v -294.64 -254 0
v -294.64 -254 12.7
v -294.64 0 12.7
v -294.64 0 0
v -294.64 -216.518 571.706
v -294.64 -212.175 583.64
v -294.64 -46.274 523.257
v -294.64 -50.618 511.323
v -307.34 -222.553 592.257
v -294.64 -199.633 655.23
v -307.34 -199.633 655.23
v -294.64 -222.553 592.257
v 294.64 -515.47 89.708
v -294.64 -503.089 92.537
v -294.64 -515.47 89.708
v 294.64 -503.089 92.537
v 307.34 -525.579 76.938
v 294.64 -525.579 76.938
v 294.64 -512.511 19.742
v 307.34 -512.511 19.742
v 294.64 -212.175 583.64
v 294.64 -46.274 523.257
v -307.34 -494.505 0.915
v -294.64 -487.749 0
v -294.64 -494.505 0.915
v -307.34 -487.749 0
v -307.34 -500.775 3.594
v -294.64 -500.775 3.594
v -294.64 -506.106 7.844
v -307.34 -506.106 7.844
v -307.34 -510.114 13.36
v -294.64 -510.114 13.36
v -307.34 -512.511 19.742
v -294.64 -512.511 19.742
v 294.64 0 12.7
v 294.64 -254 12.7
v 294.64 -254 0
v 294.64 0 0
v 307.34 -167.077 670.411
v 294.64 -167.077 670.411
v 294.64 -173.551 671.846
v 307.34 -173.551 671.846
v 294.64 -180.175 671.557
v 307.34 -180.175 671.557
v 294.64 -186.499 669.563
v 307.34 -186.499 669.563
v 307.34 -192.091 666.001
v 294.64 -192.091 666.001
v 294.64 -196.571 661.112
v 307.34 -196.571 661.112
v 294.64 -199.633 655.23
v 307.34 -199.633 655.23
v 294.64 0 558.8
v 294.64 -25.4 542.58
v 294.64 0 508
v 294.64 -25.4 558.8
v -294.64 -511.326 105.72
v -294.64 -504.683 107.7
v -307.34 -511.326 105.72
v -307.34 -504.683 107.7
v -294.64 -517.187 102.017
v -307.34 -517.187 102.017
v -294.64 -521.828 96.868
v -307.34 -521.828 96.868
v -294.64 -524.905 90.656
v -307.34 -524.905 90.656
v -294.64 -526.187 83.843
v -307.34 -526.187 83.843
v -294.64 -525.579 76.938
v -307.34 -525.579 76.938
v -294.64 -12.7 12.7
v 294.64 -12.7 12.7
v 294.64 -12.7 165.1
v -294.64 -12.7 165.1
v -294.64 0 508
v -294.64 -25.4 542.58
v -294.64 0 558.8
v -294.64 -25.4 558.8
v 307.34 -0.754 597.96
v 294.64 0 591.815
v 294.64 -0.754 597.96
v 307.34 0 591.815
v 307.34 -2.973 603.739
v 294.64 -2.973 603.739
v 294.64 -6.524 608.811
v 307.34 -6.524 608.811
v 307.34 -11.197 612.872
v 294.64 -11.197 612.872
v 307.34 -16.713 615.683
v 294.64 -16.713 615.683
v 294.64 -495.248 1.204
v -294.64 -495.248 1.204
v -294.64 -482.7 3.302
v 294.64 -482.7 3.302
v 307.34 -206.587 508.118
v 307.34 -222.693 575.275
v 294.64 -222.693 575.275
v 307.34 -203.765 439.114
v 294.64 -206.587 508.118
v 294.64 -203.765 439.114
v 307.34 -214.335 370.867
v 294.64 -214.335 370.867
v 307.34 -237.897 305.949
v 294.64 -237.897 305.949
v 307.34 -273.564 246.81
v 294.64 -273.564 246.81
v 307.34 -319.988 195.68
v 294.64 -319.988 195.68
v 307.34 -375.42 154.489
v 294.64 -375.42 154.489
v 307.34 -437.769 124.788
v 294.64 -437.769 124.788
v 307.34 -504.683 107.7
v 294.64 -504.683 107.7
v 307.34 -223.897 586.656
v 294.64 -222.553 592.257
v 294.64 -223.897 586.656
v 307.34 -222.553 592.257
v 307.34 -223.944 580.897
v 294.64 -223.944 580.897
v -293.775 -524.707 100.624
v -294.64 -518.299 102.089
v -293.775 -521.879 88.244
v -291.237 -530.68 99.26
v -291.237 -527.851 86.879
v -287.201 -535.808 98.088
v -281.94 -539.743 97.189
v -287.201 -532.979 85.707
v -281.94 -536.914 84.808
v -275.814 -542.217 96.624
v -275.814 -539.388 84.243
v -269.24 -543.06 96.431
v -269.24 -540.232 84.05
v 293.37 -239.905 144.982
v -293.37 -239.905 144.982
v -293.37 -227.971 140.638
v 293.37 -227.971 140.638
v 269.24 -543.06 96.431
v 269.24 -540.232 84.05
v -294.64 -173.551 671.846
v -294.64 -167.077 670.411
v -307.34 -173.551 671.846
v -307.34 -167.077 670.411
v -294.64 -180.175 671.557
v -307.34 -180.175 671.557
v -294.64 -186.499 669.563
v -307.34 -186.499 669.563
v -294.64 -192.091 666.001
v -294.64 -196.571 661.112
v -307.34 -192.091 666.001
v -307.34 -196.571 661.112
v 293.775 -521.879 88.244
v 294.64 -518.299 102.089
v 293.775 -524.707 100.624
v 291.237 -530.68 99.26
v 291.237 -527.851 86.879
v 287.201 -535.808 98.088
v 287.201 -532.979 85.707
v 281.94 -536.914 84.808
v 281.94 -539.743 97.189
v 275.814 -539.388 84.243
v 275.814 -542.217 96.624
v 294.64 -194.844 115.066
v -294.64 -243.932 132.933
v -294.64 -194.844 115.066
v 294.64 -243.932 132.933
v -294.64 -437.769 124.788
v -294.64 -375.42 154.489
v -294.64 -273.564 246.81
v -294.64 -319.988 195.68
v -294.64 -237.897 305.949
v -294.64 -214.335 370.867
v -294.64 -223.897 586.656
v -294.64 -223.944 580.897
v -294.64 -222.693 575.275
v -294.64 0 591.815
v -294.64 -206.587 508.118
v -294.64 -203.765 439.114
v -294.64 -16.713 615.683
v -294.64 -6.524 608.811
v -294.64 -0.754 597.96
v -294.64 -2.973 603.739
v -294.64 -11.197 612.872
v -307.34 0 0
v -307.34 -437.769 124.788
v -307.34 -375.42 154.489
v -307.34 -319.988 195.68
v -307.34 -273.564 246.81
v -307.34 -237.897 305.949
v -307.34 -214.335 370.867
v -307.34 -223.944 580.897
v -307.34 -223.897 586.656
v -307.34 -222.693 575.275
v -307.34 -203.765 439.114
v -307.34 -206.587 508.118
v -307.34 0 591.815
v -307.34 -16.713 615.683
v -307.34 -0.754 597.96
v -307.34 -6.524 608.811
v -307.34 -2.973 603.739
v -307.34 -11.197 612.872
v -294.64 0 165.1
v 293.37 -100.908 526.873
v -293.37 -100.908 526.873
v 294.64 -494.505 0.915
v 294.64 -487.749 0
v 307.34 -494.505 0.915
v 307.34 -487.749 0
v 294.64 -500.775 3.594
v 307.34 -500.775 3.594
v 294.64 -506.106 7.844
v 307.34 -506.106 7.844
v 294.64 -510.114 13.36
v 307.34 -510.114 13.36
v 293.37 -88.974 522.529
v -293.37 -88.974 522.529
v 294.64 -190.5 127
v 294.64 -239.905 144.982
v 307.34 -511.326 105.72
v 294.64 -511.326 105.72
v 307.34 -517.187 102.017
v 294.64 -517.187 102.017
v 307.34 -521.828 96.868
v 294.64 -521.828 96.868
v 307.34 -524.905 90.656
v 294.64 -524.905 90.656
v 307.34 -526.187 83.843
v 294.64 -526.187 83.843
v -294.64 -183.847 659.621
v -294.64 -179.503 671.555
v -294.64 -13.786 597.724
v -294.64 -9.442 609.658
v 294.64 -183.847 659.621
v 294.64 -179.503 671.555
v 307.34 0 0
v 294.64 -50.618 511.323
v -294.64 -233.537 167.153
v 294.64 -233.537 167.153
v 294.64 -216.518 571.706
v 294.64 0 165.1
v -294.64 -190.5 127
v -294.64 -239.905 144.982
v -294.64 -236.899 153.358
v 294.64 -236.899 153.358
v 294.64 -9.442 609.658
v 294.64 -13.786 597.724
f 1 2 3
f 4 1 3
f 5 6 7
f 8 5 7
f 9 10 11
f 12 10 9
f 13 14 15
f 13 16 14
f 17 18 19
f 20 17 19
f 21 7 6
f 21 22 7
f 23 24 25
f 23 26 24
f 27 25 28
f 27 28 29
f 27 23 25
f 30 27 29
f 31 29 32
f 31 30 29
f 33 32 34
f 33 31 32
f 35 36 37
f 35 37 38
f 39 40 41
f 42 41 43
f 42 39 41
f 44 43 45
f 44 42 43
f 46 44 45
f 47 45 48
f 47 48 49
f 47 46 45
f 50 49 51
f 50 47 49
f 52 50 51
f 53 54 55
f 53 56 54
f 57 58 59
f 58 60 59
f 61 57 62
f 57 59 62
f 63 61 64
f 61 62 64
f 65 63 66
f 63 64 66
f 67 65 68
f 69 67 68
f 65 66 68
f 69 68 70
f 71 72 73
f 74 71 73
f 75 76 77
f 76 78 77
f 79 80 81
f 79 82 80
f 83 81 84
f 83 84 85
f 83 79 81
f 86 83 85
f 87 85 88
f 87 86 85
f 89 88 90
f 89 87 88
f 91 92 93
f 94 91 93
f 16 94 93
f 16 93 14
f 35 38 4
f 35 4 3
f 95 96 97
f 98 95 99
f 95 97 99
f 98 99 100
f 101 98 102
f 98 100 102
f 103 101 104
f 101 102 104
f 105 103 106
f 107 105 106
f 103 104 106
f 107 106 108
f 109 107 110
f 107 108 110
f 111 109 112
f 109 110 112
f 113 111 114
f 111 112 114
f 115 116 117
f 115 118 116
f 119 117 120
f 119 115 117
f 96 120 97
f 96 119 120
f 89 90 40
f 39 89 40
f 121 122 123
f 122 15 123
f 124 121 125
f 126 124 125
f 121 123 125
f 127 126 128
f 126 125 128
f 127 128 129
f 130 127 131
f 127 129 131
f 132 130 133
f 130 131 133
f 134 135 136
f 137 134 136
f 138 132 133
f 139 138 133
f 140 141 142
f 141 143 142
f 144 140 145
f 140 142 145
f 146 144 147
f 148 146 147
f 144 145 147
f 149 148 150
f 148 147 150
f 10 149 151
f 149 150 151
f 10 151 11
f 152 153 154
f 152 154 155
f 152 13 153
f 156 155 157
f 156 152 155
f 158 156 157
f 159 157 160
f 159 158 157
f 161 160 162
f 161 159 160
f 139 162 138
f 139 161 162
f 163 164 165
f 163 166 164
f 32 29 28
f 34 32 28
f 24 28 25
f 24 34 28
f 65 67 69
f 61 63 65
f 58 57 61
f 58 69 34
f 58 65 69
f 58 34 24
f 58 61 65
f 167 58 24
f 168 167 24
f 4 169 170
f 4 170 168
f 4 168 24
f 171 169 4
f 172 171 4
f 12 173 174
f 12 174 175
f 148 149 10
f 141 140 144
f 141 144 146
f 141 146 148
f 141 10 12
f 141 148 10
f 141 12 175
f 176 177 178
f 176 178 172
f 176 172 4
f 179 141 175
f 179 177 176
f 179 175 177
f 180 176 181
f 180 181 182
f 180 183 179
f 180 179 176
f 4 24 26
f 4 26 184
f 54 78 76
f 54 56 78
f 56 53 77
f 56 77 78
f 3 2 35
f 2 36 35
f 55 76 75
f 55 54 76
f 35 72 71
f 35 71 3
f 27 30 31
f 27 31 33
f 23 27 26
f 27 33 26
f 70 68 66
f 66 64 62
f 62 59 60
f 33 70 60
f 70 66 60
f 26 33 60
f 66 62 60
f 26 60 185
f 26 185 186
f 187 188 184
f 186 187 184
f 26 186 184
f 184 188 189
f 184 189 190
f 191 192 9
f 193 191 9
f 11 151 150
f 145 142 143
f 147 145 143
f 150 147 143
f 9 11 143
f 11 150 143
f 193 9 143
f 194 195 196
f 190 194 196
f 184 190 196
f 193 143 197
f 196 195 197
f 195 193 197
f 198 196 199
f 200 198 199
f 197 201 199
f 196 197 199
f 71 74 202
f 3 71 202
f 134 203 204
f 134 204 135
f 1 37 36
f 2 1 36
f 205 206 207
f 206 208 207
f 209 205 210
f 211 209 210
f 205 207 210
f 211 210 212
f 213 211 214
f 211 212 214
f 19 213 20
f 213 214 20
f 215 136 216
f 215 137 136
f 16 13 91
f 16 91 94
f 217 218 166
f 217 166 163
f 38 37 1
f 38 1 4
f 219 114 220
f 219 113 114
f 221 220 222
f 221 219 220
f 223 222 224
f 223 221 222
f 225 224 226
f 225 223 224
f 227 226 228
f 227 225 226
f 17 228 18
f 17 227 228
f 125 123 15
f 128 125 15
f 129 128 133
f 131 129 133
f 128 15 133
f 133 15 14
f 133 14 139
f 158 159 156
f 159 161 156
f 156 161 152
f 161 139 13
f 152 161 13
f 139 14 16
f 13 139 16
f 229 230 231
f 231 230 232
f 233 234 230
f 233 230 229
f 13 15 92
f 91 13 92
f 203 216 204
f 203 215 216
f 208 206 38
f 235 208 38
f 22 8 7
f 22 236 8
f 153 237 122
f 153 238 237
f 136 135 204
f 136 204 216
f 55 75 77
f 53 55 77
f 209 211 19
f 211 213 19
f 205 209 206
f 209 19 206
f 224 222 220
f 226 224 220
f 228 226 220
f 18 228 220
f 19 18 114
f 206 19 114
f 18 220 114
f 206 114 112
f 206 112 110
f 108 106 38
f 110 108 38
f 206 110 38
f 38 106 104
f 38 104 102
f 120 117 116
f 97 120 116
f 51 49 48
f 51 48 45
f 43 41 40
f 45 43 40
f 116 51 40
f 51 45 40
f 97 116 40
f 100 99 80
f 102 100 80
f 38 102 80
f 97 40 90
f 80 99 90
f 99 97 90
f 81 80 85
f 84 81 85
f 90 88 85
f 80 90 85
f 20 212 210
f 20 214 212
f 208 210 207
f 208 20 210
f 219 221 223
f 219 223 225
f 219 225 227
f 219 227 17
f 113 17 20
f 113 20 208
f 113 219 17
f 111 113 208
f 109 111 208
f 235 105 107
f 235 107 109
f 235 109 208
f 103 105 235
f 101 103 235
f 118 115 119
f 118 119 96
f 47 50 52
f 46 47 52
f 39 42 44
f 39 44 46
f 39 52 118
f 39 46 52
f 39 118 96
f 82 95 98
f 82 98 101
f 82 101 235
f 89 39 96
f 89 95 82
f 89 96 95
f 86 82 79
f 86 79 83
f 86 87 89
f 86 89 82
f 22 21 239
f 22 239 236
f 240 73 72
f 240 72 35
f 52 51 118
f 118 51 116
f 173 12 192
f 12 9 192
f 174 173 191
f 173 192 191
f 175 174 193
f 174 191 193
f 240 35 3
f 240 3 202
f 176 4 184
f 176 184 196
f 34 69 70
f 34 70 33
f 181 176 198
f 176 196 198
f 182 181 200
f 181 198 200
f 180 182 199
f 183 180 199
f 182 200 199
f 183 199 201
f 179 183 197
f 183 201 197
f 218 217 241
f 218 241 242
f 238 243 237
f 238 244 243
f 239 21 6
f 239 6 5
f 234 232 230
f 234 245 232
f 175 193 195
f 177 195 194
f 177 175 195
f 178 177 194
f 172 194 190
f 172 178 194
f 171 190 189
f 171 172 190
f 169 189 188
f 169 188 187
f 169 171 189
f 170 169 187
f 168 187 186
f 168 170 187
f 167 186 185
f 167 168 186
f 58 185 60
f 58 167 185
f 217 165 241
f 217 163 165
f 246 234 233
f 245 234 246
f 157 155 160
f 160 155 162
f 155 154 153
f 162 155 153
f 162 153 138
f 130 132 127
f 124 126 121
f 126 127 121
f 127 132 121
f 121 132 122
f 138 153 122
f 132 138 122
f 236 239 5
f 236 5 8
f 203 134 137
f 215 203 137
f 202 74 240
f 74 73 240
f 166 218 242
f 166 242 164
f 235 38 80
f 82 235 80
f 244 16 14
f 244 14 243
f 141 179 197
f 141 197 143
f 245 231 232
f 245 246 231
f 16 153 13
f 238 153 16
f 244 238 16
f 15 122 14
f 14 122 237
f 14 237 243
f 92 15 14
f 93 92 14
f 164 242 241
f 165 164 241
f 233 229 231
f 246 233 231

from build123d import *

# Parameters (mm, degrees)
F3_DEPTH  = 12.7
F6_DEPTH  = 12.7
F7_R      = 25.4
F7_2_R    = 25.4
F9_DEPTH  = 294.64
F10_DEPTH = 294.64
F11_DEPTH = 294.64
F12_DEPTH = 25.4
F13_R     = 25.4
F15_DEPTH = 294.64
F17_DEPTH = 294.64
F18_W     = 254
F18_H     = 12.7
F19_DEPTH = 294.64
F20_W     = 12.7
F20_H     = 152.4
F21_DEPTH = 294.64
F23_DEPTH = 293.37
F25_DEPTH = 294.64


with BuildPart() as f3:
    # F2 (on offset) → F3 (new body)
    with BuildSketch(Plane.YZ.offset(294.64)):
        with BuildLine():
            Line((-508, 0), (0, 0))
            Line((0, 0), (0, 609.6))
            Line((0, 609.6), (-190.9455405437, 679.0984931238))
            Line((-190.9455405437, 679.0984931238), (-225.6947871056, 583.6257228519))
            ThreePointArc((-225.6947871056, 583.6257228519), (-259.177173919, 267.6439817216), (-531.8944548557, 104.5770763332))
            Line((-531.8944548557, 104.5770763332), (-508, 0))
        make_face()
    extrude(amount=F3_DEPTH)

    # F7
    f7_edges = [f3.edges().sort_by_distance(p)[0] for p in [
        (300.99, 0, 609.6),
        (300.99, -190.945541, 679.098493),
        (300.99, -225.694787, 583.625723),
        (300.99, -531.894455, 104.577076),
        (300.99, -508, 0),
    ]]
    fillet(f7_edges, radius=F7_R)


with BuildPart() as f6:
    # F5 (on offset) → F6 (new body)
    with BuildSketch(Plane.YZ.offset(-294.64)):
        with BuildLine():
            Line((-508, 0), (0, 0))
            Line((0, 0), (0, 609.6))
            Line((0, 609.6), (-190.9455405437, 679.0984931238))
            Line((-190.9455405437, 679.0984931238), (-225.6947871056, 583.6257228519))
            ThreePointArc((-225.6947871056, 583.6257228519), (-259.177173919, 267.6439817216), (-531.8944548557, 104.5770763332))
            Line((-531.8944548557, 104.5770763332), (-508, 0))
        make_face()
    extrude(amount=-F6_DEPTH)

    # F7#2
    f7_2_edges = [f6.edges().sort_by_distance(p)[0] for p in [
        (-300.99, -225.694787, 583.625723),
        (-300.99, -190.945541, 679.098493),
        (-300.99, 0, 609.6),
        (-300.99, -531.894455, 104.577076),
        (-300.99, -508, 0),
    ]]
    fillet(f7_2_edges, radius=F7_2_R)


with BuildPart() as f9:
    # F8 (on Right) → F9 (new body, symmetric)
    with BuildSketch(Plane.YZ):
        Polygon((-518.2986226671, 102.0887864602), (-515.4697464551, 89.7078551795), (-503.0888151744, 92.5367313915), (-236.8987926395, 153.3575699491), (-233.5372032111, 167.1529393358), align=None)
    extrude(amount=F9_DEPTH, both=True)

    # F12 (add): a face of the model
    f12_faces = [f9.faces().sort_by_distance(p)[0] for p in [
        (0, -516.8841845611, 95.8983208198),
    ]]
    extrude(f12_faces, amount=F12_DEPTH)

    # F13
    f13_edges = [f9.edges().sort_by_distance(p)[0] for p in [
        (-294.64, -541.646047, 90.240568),
        (294.64, -541.646047, 90.240568),
    ]]
    fillet(f13_edges, radius=F13_R)


with BuildPart() as f10:
    # F8 (on Right) → F10 (new body, symmetric)
    with BuildSketch(Plane.YZ):
        Polygon((-515.4697464551, 89.7078551795), (-495.24789644, 1.204394213), (-482.6999233712, 3.3021911042), (-503.0888151744, 92.5367313915), align=None)
    extrude(amount=F10_DEPTH, both=True)


with BuildPart() as f11:
    # F0 (on Right) → F11 (new body, symmetric)
    with BuildSketch(Plane.YZ):
        Polygon((-25.4, 542.5802856922), (0, 508), (0, 558.8), (-25.4, 558.8), align=None)
    extrude(amount=F11_DEPTH, both=True)


with BuildPart() as f15:
    # F14 (on Right) → F15 (new body, symmetric)
    with BuildSketch(Plane.YZ):
        Polygon((-9.4422581348, 609.6579364777), (-179.5031301816, 671.5550319161), (-183.8467860018, 659.6209356321), (-13.7859139551, 597.7238401937), align=None)
    extrude(amount=F15_DEPTH, both=True)


with BuildPart() as f17:
    # F16 (on Right) → F17 (new body, symmetric)
    with BuildSketch(Plane.YZ):
        Polygon((-46.2742848321, 523.2568957286), (-212.1746461021, 583.6396890849), (-216.5183019223, 571.7055928009), (-50.6179406523, 511.3227994446), align=None)
    extrude(amount=F17_DEPTH, both=True)


with BuildPart() as f19:
    # F18 (on Right) → F19 (new body, symmetric)
    with BuildSketch(Plane.YZ):
        with Locations((-127, 6.35)):
            Rectangle(F18_W, F18_H)
    extrude(amount=F19_DEPTH, both=True)


with BuildPart() as f21:
    # F20 (on Right) → F21 (new body, symmetric)
    with BuildSketch(Plane.YZ):
        with Locations((-6.35, 88.9)):
            Rectangle(F20_W, F20_H)
    extrude(amount=F21_DEPTH, both=True)


with BuildPart() as f23:
    # F22 (on Right) → F23 (new body, symmetric)
    with BuildSketch(Plane.YZ):
        Polygon((-88.9741059927, 522.5294433083), (-100.9082022767, 526.8730991285), (-239.9051885242, 144.9820180411), (-227.9710922402, 140.6383622209), align=None)
    extrude(amount=F23_DEPTH, both=True)


with BuildPart() as f25:
    # F24 (on Right) → F25 (new body, symmetric)
    with BuildSketch(Plane.YZ):
        Polygon((-194.8436558202, 115.065903716), (-190.5, 127), (-239.9051885242, 144.9820180411), (-243.9318360877, 132.9325401877), align=None)
    extrude(amount=F25_DEPTH, both=True)


solid = Compound([f3.part, f6.part, f9.part, f10.part, f11.part, f15.part, f17.part, f19.part, f21.part, f23.part, f25.part])
